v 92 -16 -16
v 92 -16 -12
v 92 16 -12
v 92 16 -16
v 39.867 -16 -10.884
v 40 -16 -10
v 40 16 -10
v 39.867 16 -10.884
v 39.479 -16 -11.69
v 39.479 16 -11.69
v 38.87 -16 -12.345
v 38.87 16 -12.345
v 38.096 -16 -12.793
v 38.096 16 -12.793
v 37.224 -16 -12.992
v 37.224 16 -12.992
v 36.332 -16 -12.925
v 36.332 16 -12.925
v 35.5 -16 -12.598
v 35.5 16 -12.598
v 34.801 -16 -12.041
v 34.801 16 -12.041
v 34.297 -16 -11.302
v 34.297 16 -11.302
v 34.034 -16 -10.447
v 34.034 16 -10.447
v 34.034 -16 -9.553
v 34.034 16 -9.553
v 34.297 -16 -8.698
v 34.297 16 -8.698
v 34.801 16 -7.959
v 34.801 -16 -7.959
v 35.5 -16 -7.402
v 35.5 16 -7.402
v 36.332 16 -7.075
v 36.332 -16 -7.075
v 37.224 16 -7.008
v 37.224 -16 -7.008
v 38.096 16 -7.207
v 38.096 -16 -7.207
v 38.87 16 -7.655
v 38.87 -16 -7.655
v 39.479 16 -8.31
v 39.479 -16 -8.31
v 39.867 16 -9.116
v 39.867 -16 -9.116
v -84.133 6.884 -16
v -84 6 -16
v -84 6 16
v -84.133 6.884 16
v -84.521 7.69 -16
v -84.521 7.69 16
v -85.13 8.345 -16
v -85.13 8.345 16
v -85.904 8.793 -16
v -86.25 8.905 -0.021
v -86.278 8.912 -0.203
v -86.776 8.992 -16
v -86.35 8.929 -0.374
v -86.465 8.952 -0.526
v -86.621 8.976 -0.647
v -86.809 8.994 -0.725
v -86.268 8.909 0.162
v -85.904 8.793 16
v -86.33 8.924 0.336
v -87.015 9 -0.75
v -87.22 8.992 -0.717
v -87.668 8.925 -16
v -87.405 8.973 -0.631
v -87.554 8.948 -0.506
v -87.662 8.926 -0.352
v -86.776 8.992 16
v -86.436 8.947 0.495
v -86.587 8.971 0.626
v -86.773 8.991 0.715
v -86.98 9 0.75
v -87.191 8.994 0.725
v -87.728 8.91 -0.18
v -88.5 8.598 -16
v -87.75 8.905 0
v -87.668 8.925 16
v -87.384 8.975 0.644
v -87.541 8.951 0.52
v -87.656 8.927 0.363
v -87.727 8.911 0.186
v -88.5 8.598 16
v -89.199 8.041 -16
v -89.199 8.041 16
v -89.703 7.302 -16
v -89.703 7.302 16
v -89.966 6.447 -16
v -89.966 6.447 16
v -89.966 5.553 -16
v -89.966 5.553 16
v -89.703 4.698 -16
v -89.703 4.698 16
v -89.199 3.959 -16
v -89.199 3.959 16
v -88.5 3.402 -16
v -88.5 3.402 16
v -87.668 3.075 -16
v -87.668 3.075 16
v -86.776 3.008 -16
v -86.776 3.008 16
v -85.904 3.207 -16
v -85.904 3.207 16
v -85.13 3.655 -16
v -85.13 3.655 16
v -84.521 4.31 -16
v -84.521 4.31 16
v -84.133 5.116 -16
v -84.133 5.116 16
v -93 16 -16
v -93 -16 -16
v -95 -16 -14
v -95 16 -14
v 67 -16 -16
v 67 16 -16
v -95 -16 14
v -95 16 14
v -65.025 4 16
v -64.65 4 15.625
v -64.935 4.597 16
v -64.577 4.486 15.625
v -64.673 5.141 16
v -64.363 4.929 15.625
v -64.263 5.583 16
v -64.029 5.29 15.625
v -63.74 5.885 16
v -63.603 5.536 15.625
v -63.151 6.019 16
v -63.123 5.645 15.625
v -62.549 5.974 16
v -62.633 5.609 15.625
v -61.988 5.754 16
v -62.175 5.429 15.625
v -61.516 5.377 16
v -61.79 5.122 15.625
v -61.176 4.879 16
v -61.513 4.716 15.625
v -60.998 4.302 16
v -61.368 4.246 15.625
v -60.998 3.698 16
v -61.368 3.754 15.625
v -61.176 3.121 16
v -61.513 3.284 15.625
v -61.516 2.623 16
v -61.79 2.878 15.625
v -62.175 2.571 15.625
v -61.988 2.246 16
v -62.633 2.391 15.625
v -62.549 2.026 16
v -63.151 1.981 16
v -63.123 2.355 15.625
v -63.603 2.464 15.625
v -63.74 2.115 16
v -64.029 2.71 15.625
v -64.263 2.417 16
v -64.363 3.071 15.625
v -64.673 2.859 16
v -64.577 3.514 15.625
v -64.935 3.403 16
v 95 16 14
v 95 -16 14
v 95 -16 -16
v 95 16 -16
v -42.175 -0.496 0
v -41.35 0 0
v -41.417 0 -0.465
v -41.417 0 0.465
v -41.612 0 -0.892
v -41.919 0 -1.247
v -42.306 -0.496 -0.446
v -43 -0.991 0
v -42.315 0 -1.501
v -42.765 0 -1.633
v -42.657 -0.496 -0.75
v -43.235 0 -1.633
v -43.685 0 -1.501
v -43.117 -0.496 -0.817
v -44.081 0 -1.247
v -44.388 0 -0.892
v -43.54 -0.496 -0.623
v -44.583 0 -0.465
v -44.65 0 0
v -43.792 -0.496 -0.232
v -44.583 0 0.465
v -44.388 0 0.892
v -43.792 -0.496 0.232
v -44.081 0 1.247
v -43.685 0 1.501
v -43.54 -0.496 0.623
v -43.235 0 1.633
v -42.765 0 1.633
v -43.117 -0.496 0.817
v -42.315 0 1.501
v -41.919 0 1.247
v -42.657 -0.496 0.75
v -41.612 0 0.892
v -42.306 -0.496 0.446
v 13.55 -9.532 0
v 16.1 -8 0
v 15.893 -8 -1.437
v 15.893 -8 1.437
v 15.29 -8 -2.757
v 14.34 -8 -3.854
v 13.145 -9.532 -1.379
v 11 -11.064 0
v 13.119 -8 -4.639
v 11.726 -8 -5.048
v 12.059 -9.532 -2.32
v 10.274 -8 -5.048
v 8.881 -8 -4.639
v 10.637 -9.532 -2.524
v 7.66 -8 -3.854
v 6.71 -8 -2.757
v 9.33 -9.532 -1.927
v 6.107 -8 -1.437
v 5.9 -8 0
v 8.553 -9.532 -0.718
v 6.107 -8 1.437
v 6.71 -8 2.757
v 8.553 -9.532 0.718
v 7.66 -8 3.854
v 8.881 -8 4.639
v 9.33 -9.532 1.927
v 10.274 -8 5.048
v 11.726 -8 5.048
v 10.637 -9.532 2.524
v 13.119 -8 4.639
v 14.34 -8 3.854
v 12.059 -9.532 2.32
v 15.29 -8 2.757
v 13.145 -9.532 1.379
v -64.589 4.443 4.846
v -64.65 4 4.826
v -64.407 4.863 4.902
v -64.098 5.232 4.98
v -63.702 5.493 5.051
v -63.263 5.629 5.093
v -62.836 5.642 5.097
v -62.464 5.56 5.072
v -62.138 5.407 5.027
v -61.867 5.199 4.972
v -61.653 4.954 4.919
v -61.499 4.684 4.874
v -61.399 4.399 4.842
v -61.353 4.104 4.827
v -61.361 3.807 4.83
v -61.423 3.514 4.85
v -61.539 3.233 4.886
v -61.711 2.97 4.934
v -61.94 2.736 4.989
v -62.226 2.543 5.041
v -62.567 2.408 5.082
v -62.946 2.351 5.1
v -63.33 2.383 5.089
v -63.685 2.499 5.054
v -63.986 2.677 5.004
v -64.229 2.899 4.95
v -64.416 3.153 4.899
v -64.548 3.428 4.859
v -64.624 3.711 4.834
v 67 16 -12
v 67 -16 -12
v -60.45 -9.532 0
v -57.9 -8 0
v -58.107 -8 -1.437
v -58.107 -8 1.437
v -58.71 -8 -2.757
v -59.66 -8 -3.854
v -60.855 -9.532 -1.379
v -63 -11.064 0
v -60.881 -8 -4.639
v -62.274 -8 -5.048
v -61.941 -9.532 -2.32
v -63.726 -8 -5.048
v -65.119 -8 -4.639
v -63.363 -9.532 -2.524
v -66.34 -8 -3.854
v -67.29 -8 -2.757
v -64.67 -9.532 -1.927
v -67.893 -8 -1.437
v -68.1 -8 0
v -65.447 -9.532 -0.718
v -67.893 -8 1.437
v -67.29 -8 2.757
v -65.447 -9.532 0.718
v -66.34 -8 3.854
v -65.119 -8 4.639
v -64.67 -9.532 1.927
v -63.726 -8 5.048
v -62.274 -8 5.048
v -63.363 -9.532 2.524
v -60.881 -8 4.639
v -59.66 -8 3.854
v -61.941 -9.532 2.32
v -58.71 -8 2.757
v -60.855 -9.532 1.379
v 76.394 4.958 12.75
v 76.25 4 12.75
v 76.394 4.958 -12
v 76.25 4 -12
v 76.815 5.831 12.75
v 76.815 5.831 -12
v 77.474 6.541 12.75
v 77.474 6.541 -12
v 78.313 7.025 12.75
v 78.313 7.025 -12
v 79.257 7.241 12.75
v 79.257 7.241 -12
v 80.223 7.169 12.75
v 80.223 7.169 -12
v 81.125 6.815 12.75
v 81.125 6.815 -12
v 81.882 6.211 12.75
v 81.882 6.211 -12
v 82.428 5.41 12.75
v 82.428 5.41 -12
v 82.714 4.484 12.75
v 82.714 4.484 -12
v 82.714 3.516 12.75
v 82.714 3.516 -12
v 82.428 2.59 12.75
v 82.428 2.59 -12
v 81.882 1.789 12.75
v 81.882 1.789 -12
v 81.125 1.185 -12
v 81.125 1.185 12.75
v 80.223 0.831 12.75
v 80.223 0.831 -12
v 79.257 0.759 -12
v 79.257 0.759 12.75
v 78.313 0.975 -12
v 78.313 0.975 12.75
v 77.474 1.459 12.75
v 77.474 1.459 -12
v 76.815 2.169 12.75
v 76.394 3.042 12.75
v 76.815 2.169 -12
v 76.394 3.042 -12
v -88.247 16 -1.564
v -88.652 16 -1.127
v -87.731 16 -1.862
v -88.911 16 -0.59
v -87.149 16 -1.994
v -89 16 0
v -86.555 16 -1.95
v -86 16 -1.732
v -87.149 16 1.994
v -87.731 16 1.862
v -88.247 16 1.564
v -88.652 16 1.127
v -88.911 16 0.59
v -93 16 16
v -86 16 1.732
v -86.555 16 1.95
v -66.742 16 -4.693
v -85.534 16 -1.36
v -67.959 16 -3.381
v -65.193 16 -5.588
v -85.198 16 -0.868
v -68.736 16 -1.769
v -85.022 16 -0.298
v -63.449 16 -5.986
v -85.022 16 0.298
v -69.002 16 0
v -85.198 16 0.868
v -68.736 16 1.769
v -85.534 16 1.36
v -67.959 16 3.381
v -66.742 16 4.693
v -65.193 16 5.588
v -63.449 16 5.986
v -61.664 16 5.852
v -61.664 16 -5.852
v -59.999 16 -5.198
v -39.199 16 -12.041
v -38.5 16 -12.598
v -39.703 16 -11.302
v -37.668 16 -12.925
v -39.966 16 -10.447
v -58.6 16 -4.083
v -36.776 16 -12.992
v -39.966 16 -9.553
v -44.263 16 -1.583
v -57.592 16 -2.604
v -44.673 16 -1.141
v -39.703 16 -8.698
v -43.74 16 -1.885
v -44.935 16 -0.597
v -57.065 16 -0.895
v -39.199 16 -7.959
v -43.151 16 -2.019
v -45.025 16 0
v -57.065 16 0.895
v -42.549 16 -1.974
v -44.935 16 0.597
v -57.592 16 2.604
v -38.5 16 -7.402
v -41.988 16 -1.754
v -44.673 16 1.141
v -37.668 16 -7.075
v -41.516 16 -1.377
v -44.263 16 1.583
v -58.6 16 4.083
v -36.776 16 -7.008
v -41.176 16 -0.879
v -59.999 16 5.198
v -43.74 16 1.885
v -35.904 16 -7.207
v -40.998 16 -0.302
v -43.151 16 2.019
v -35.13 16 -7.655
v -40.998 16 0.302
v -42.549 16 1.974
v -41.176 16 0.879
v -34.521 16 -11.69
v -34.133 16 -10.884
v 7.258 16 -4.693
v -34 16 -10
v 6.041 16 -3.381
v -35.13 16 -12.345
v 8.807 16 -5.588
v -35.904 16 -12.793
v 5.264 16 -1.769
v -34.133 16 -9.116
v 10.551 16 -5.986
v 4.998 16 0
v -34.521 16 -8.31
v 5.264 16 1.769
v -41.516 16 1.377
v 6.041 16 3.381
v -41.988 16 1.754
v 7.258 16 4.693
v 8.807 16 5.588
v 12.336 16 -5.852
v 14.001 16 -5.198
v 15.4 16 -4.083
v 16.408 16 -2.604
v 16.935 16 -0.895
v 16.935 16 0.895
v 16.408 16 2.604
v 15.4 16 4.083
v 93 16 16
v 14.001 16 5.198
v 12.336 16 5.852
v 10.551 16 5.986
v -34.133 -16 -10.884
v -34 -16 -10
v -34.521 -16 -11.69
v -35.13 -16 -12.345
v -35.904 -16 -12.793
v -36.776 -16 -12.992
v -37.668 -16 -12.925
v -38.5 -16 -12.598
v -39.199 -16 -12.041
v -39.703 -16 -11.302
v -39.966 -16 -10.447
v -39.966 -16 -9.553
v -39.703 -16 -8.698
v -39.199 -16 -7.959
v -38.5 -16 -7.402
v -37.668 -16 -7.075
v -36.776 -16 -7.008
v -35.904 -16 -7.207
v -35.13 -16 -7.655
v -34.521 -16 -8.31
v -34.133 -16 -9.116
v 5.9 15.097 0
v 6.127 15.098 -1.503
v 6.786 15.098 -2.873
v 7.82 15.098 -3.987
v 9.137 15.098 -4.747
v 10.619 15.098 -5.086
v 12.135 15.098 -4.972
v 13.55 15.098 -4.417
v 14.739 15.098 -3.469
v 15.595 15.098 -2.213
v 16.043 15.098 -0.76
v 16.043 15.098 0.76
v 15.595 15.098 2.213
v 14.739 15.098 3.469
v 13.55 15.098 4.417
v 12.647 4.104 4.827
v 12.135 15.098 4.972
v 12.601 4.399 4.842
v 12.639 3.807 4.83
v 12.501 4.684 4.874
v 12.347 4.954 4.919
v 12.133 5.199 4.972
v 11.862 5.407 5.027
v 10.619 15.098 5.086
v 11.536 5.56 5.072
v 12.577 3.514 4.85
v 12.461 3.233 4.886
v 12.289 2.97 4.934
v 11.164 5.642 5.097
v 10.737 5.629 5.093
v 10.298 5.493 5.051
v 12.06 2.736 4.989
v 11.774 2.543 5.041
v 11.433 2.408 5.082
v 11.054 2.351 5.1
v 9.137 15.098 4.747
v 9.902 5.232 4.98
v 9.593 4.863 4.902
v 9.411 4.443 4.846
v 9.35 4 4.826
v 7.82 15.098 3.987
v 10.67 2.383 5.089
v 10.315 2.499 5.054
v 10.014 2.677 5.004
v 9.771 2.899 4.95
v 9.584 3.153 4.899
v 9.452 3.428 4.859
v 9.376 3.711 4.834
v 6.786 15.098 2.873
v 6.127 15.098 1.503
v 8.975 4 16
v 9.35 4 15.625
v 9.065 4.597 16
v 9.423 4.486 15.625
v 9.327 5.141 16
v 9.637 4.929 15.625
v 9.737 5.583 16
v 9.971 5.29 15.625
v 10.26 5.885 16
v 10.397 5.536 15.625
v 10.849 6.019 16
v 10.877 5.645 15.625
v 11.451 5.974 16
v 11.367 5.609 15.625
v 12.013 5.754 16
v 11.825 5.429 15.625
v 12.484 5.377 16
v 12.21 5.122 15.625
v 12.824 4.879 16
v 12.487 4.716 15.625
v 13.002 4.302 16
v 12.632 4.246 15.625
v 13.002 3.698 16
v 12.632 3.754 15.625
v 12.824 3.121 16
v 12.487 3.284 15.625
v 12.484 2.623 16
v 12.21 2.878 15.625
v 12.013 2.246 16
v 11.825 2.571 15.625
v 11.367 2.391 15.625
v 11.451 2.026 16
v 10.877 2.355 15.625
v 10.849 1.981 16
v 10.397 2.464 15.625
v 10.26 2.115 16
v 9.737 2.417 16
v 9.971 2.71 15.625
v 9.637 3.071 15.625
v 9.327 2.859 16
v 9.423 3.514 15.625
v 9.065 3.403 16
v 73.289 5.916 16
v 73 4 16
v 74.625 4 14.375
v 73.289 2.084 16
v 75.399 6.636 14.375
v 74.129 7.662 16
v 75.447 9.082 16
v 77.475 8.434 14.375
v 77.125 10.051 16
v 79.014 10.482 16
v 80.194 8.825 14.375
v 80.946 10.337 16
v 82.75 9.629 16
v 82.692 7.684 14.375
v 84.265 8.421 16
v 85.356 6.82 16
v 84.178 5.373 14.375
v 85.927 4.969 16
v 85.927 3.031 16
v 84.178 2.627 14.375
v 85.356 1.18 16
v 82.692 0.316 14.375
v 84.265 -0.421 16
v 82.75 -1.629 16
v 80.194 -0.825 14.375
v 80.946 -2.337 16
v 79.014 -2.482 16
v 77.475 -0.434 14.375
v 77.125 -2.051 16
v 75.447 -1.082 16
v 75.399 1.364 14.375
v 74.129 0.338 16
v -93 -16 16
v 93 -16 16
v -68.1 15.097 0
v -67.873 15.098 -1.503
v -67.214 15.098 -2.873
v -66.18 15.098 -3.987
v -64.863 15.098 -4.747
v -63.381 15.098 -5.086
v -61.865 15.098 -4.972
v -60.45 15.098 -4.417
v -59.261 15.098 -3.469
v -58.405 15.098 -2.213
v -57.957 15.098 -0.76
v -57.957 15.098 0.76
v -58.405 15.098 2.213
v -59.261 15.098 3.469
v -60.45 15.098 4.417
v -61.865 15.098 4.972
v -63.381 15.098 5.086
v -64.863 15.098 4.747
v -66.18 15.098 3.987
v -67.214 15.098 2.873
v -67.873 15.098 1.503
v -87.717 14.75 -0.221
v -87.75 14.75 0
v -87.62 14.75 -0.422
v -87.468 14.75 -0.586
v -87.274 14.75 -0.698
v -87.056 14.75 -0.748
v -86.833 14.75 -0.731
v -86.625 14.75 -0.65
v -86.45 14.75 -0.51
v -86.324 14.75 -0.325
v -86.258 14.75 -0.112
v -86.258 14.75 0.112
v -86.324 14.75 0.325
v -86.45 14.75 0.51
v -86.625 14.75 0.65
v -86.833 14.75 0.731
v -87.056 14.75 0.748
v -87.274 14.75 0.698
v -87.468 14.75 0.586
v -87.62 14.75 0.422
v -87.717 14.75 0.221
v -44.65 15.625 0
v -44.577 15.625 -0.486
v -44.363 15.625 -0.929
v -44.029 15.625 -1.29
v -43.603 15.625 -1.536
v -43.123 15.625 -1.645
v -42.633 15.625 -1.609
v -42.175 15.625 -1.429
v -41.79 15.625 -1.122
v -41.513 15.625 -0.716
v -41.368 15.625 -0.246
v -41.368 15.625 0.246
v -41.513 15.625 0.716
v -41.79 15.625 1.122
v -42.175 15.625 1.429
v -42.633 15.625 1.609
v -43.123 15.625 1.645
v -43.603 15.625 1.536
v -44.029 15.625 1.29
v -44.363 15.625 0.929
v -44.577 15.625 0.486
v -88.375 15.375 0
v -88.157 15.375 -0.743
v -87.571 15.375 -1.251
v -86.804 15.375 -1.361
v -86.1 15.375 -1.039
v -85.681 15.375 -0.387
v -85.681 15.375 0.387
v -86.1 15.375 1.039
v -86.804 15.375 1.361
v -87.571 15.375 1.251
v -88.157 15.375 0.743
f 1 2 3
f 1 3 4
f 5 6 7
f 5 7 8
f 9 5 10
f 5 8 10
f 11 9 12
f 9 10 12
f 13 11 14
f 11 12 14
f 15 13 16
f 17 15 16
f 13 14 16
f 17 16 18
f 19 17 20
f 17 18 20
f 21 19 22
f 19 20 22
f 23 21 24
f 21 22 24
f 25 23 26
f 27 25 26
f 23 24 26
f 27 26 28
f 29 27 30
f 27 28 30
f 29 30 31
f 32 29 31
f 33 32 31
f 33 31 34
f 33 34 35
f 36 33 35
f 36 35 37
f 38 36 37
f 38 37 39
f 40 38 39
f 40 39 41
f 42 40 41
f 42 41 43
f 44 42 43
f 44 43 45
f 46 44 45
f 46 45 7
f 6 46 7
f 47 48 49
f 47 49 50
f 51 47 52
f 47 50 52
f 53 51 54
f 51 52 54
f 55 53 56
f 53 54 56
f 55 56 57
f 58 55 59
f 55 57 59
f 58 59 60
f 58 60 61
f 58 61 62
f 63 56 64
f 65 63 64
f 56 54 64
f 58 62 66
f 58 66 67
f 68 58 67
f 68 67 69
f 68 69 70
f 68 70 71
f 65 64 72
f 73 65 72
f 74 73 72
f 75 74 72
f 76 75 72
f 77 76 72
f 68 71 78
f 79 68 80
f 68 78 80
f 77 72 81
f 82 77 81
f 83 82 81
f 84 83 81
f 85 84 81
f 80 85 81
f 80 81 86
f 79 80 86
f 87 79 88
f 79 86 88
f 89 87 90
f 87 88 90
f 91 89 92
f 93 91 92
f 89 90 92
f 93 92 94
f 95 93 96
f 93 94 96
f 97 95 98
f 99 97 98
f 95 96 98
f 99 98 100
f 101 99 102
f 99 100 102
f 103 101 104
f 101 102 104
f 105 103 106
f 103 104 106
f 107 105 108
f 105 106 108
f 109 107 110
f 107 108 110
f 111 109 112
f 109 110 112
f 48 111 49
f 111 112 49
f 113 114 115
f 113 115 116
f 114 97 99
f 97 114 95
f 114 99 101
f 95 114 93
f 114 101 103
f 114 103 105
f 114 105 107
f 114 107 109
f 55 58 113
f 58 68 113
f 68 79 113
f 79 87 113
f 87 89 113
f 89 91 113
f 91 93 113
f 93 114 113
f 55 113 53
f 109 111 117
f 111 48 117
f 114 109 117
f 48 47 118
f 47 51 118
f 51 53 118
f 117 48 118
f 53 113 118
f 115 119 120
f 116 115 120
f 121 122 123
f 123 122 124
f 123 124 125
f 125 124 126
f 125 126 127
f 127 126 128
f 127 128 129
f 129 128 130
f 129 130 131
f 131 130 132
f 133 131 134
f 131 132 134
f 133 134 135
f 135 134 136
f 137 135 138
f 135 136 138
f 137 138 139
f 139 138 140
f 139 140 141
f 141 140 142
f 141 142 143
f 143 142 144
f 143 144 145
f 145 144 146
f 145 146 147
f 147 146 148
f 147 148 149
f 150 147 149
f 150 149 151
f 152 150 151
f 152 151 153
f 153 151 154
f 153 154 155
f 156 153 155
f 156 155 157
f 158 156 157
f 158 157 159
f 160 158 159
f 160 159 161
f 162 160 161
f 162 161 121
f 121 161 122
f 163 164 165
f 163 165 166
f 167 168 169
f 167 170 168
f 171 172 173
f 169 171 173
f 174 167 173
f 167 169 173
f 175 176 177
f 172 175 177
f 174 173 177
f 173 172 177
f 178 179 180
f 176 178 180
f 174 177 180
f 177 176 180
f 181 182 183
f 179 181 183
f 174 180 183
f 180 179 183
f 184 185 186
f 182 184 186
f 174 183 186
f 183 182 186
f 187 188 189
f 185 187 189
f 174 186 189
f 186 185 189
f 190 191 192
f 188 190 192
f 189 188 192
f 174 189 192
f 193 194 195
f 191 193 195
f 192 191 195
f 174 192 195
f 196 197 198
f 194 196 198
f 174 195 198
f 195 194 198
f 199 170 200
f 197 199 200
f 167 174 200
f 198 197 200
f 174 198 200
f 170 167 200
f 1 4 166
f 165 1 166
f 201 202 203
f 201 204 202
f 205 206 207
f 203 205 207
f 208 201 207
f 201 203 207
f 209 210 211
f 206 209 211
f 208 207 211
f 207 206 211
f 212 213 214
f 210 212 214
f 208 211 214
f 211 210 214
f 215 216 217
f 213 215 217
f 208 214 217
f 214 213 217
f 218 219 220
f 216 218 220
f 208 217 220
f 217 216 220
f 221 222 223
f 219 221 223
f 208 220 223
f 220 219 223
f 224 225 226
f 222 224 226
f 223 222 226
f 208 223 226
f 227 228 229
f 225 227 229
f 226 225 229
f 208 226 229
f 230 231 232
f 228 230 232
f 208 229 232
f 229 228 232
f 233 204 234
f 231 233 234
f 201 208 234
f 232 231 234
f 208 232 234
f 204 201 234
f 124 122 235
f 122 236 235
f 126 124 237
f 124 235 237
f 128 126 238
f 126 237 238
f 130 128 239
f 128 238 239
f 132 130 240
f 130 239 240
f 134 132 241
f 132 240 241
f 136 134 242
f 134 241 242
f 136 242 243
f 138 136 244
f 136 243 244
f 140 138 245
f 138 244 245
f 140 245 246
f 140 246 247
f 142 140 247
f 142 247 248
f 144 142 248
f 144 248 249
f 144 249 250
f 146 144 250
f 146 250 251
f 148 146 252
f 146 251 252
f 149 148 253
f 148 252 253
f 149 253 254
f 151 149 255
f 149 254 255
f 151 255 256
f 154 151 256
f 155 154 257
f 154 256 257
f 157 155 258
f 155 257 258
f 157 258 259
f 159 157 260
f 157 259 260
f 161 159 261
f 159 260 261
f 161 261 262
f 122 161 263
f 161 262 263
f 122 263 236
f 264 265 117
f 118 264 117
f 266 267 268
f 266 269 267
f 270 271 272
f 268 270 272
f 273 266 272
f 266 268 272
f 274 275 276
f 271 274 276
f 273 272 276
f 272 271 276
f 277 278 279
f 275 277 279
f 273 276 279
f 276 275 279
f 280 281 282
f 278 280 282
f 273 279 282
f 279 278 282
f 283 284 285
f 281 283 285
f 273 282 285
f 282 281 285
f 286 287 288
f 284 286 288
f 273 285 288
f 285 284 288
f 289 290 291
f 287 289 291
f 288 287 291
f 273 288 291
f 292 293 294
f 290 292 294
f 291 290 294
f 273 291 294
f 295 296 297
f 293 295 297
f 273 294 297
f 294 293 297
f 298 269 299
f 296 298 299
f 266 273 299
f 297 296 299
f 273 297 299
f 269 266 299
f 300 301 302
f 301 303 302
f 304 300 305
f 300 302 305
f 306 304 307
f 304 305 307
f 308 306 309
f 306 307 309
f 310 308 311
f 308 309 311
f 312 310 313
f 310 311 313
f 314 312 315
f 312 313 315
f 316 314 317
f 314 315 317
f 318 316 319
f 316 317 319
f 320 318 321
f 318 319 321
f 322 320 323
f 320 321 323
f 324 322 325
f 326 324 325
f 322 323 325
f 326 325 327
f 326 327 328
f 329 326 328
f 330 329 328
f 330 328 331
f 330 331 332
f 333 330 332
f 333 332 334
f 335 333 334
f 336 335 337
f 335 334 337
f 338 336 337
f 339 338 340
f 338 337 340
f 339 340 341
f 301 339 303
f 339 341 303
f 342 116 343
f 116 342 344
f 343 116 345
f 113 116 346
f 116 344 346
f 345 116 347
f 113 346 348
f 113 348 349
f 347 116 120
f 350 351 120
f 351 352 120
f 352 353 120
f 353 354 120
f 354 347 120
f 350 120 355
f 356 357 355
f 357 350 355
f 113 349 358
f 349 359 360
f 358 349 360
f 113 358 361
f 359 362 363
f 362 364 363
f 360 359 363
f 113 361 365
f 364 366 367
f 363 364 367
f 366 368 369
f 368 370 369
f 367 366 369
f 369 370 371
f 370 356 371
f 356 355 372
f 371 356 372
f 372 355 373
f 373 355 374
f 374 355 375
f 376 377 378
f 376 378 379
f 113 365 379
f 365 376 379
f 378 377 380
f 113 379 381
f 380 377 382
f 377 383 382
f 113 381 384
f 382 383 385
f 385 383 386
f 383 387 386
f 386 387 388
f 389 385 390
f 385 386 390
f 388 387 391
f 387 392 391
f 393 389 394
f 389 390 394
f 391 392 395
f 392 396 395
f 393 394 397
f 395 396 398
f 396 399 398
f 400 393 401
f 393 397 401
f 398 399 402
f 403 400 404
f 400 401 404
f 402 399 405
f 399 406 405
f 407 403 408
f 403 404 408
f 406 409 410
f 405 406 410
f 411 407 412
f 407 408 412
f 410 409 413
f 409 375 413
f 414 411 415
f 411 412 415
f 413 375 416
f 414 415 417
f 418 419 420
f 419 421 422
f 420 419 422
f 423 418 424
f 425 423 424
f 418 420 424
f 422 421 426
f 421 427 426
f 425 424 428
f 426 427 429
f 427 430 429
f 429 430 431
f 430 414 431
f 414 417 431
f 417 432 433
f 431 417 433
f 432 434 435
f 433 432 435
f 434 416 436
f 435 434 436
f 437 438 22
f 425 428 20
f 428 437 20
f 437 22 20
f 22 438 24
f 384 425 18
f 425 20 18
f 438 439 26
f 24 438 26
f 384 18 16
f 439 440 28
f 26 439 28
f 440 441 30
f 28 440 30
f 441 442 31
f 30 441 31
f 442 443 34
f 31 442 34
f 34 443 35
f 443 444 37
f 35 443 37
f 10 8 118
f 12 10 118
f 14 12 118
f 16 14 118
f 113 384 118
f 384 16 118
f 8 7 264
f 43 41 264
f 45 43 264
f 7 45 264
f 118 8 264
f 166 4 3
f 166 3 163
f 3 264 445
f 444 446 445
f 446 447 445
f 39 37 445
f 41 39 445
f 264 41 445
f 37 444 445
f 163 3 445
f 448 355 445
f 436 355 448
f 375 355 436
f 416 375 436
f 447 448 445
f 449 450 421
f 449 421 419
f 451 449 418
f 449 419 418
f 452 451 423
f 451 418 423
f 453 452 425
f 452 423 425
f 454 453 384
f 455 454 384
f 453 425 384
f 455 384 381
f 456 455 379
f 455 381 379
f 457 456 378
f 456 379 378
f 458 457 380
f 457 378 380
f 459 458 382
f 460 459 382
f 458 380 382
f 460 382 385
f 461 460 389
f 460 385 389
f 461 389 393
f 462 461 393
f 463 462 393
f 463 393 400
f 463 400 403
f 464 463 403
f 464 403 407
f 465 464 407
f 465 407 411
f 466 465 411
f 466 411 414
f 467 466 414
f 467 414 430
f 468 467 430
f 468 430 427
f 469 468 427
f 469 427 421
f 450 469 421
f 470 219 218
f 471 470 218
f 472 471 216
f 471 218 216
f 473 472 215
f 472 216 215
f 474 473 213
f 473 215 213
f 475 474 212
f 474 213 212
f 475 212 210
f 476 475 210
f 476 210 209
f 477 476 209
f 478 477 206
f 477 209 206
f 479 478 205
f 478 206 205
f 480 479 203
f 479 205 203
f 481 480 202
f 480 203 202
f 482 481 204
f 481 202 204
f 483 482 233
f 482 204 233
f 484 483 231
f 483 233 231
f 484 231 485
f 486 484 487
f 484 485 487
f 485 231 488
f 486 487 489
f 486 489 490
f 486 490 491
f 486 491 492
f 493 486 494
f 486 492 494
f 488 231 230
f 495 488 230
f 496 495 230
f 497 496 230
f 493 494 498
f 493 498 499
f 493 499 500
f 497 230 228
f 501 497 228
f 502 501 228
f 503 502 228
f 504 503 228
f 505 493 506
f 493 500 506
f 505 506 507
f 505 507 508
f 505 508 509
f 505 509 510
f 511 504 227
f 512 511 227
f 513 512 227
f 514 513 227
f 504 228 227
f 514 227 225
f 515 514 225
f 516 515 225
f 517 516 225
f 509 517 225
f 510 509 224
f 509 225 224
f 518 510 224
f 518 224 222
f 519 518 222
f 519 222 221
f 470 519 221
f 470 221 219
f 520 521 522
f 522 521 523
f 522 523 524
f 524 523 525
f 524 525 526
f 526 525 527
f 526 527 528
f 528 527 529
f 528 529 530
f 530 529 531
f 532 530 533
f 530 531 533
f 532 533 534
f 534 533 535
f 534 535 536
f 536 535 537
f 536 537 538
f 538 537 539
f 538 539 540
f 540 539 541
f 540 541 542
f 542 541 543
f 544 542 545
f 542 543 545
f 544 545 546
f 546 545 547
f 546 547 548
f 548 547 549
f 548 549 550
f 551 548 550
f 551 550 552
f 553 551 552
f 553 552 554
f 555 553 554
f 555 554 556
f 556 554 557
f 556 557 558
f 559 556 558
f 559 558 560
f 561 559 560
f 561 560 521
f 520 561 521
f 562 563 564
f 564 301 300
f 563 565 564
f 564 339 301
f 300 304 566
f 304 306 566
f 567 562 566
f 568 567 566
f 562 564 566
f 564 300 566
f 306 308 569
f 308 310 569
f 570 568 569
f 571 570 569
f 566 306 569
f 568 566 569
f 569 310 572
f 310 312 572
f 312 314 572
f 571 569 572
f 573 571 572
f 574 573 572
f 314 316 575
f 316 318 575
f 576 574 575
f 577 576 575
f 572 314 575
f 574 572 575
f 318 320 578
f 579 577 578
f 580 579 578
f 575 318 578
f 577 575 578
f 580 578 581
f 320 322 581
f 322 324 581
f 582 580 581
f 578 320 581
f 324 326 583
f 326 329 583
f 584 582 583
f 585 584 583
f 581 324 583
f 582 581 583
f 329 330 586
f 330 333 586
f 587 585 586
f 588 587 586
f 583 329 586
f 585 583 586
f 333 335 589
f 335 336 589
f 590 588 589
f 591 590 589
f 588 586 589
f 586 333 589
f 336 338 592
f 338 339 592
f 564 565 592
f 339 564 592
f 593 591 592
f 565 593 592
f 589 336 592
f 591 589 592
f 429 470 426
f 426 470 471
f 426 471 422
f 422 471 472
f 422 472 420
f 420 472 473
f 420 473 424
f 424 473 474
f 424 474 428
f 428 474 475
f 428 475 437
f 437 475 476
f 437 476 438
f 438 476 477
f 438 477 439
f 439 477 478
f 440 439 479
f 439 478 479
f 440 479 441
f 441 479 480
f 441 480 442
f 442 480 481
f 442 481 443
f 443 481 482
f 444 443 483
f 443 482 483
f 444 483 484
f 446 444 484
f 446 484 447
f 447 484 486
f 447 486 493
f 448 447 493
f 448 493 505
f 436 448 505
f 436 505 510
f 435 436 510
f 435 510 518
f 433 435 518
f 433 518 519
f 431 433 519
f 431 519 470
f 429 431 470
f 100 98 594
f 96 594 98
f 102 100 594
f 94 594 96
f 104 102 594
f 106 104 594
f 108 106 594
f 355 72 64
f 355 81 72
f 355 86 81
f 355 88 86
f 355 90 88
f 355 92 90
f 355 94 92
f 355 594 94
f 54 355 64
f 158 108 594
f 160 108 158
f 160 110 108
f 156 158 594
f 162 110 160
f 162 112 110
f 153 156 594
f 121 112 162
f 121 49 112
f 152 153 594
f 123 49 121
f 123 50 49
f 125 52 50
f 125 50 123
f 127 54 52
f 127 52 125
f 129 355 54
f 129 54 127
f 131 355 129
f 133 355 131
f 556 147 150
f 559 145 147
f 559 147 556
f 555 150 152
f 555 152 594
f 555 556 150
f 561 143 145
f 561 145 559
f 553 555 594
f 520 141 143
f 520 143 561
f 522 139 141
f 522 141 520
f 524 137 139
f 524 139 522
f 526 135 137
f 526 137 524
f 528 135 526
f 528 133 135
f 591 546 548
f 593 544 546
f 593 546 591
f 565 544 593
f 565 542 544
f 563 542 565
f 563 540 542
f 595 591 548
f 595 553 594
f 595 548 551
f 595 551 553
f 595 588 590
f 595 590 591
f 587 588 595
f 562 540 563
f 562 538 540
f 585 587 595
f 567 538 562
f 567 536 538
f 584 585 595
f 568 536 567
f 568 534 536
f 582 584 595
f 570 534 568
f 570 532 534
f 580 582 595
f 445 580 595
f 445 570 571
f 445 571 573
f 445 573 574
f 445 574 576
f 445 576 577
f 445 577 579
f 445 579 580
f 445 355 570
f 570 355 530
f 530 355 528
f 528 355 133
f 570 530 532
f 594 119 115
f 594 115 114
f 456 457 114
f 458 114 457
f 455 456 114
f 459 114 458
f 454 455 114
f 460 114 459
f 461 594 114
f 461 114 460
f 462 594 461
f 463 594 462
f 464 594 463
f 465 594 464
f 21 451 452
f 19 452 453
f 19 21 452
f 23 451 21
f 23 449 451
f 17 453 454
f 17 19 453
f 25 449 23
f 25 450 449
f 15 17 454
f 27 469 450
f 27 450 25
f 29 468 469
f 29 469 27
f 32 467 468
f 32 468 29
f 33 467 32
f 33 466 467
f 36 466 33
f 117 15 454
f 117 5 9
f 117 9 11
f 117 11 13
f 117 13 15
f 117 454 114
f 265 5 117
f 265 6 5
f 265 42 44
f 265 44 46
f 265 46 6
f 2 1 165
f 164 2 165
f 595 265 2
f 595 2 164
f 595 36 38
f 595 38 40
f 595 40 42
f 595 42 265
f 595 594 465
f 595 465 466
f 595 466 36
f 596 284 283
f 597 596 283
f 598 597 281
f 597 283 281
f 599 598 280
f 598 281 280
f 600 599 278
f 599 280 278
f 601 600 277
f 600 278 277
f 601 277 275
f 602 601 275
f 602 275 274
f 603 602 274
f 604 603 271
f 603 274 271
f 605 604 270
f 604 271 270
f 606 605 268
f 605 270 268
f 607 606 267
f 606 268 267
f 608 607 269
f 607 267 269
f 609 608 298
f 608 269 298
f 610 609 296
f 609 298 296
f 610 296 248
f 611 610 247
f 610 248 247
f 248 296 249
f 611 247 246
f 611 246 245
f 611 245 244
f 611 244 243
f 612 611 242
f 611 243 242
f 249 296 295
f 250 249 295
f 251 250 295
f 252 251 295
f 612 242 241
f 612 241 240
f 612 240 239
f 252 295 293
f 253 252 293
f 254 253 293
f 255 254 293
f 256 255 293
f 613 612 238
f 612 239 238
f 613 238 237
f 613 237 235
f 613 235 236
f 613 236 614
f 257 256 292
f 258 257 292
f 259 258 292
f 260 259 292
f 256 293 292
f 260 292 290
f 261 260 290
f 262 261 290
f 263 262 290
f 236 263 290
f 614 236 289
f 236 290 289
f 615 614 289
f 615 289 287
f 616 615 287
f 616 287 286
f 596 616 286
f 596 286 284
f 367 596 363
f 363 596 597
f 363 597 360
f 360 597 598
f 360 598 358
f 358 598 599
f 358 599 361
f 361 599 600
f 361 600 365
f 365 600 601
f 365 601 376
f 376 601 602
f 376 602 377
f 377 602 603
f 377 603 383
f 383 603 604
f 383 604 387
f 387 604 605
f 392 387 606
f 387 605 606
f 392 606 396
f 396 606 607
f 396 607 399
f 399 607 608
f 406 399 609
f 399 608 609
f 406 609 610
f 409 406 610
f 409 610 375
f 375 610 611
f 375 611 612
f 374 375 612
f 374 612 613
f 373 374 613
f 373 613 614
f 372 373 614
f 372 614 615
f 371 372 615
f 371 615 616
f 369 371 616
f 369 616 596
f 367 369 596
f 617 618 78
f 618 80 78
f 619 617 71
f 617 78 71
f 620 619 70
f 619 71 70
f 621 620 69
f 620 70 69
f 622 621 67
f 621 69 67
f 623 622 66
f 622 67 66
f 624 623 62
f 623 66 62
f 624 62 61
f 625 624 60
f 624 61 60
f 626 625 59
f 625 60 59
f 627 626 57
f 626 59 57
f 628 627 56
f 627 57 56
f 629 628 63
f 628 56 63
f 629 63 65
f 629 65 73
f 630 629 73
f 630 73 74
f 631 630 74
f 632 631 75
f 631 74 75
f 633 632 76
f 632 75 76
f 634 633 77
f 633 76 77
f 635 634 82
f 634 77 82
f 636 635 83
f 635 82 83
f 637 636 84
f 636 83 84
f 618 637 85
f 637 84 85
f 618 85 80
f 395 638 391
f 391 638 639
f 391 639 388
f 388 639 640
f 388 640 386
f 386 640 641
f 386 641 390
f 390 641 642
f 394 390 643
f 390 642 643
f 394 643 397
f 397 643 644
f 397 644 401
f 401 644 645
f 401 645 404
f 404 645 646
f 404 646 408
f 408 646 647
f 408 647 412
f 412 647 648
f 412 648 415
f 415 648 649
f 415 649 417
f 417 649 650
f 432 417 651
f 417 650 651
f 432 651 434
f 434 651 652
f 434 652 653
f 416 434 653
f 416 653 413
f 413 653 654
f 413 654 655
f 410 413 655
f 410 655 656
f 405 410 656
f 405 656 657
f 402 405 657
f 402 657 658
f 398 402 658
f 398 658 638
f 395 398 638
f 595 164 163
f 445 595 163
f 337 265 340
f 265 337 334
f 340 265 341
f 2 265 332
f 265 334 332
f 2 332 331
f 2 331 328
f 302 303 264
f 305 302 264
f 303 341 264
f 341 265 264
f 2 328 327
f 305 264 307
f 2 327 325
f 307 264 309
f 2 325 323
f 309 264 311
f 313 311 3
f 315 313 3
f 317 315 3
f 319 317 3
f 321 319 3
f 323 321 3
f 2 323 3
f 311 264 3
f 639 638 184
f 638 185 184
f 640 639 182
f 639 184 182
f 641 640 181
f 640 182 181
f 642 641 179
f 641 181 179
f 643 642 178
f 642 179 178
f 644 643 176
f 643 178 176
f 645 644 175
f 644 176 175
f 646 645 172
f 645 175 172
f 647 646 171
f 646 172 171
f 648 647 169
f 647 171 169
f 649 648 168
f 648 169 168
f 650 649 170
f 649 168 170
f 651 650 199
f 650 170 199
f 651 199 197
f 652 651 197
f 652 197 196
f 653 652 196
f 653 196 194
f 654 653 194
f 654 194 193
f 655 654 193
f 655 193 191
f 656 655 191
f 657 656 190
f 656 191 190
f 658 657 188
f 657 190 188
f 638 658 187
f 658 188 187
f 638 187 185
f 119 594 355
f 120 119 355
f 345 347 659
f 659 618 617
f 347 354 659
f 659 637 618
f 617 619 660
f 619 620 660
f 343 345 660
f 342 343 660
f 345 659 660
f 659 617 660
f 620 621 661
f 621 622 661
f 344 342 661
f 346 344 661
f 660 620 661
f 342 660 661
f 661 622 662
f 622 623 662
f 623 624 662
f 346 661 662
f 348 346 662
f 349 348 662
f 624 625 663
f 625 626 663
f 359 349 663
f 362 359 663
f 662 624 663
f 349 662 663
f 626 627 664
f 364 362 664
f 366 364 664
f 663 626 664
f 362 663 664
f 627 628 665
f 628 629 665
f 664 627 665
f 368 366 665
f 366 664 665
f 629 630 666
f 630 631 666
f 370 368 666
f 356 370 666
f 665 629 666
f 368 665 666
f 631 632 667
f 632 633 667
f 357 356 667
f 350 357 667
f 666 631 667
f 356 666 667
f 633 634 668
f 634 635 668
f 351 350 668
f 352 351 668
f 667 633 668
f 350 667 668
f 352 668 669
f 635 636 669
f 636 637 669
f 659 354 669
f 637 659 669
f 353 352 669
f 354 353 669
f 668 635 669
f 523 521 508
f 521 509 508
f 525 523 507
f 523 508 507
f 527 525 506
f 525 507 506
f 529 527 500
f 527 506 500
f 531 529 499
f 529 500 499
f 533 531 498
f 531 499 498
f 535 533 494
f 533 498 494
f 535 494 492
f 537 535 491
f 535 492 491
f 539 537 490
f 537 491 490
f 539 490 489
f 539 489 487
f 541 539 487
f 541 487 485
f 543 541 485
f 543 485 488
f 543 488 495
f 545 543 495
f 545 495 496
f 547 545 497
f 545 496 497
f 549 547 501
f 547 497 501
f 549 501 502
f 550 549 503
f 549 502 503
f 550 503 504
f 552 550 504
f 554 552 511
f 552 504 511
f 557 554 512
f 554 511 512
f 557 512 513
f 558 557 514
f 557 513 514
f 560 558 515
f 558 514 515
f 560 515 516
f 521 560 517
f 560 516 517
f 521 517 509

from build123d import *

# Parameters (mm, degrees)
SKETCH1_W                                            = 190
SKETCH1_H                                            = 32
BOSS_EXTRUDE1_DEPTH                                  = 16
CHAMFER1_SIZE                                        = 2
SKETCH2_W                                            = 25
SKETCH2_H                                            = 4
CUT_EXTRUDE1_DEPTH                                   = 33
M12_TAPPED_HOLE1_D                                   = 10.2
M12_TAPPED_HOLE1_DEPTH                               = 24
M12_TAPPED_HOLE1_CSINK_D                             = 12.005
M12_TAPPED_HOLE1_CSINK_ANGLE                         = 90
M12_TAPPED_HOLE1_TIP                                 = 3.064389157
M4_TAPPED_HOLE2_D                                    = 3.3
M4_TAPPED_HOLE2_DEPTH                                = 11.5
M4_TAPPED_HOLE2_CSINK_D                              = 4.05
M4_TAPPED_HOLE2_CSINK_ANGLE                          = 90
M4_TAPPED_HOLE2_TIP                                  = 0.991420021
CSK_FOR_M10_COUNTERSUNK_FLAT_HEAD_SCREW1_D           = 6.5
CSK_FOR_M10_COUNTERSUNK_FLAT_HEAD_SCREW1_CSINK_D     = 13
CSK_FOR_M10_COUNTERSUNK_FLAT_HEAD_SCREW1_CSINK_ANGLE = 90
SKETCH16_R                                           = 3
CUT_EXTRUDE2_DEPTH                                   = 33
CSK_FOR_M4_COUNTERSUNK_FLAT_HEAD_SCREW1_D            = 1.5
CSK_FOR_M4_COUNTERSUNK_FLAT_HEAD_SCREW1_DEPTH        = 10
CSK_FOR_M4_COUNTERSUNK_FLAT_HEAD_SCREW1_CSINK_D      = 4
CSK_FOR_M4_COUNTERSUNK_FLAT_HEAD_SCREW1_CSINK_ANGLE  = 90
CSK_FOR_M4_COUNTERSUNK_FLAT_HEAD_SCREW1_TIP          = 0.450645464
M4_TAPPED_HOLE3_D                                    = 3.3
M4_TAPPED_HOLE3_DEPTH                                = 16
M4_TAPPED_HOLE3_CSINK_D                              = 4.05
M4_TAPPED_HOLE3_CSINK_ANGLE                          = 90
M4_TAPPED_HOLE3_TIP                                  = 0.991420021
SKETCH24_R                                           = 3
CUT_EXTRUDE4_DEPTH                                   = 33


with BuildPart() as part:
    # Sketch1 → Boss-Extrude1 (new body, symmetric)
    with BuildSketch(Plane.XY):
        Rectangle(SKETCH1_W, SKETCH1_H)
    extrude(amount=BOSS_EXTRUDE1_DEPTH, both=True)

    # Chamfer1
    chamfer1_edges = [part.edges().sort_by_distance(p)[0] for p in [
        (-95, 0, 16),
        (95, 0, 16),
        (-95, 0, -16),
    ]]
    chamfer(chamfer1_edges, length=CHAMFER1_SIZE)

    # Sketch2 → Cut-Extrude1 (cut, through all)
    with BuildSketch(Plane(origin=(0, 16, 0), x_dir=(1, 0, 0), z_dir=(0, 1, 0))):
        with Locations((79.5, 14)):
            Rectangle(SKETCH2_W, SKETCH2_H)
    extrude(amount=-CUT_EXTRUDE1_DEPTH, mode=Mode.SUBTRACT)

    # M12 Tapped Hole1
    with Locations(Plane(origin=(0, 16, 0), x_dir=(1, 0, 0), z_dir=(0, 1, 0))):
        with Locations((-63, 0), (11, 0)):
            CounterSinkHole(M12_TAPPED_HOLE1_D / 2, M12_TAPPED_HOLE1_CSINK_D / 2, depth=M12_TAPPED_HOLE1_DEPTH, counter_sink_angle=M12_TAPPED_HOLE1_CSINK_ANGLE)
            with Locations((0, 0, -(M12_TAPPED_HOLE1_DEPTH + M12_TAPPED_HOLE1_TIP / 2))):  # 118° drill point
                Cone(0, M12_TAPPED_HOLE1_D / 2, M12_TAPPED_HOLE1_TIP, mode=Mode.SUBTRACT)

    # M4 Tapped Hole2
    with Locations(Plane(origin=(-63, 4, 16), x_dir=(1, 0, 0), z_dir=(0, 0, 1))):
        with Locations((0, 0), (74, 0)):
            CounterSinkHole(M4_TAPPED_HOLE2_D / 2, M4_TAPPED_HOLE2_CSINK_D / 2, depth=M4_TAPPED_HOLE2_DEPTH, counter_sink_angle=M4_TAPPED_HOLE2_CSINK_ANGLE)
            with Locations((0, 0, -(M4_TAPPED_HOLE2_DEPTH + M4_TAPPED_HOLE2_TIP / 2))):  # 118° drill point
                Cone(0, M4_TAPPED_HOLE2_D / 2, M4_TAPPED_HOLE2_TIP, mode=Mode.SUBTRACT)

    # CSK for M10 Countersunk Flat Head Screw1 (through all)
    with Locations(Plane.XY.offset(16)):
        with Locations((79.5, 4)):
            CounterSinkHole(CSK_FOR_M10_COUNTERSUNK_FLAT_HEAD_SCREW1_D / 2, CSK_FOR_M10_COUNTERSUNK_FLAT_HEAD_SCREW1_CSINK_D / 2, counter_sink_angle=CSK_FOR_M10_COUNTERSUNK_FLAT_HEAD_SCREW1_CSINK_ANGLE)

    # Sketch16 → Cut-Extrude2 (cut, through all)
    with BuildSketch(Plane.XY.offset(16)):
        with Locations((-87, 6)):
            Circle(SKETCH16_R)
    extrude(amount=-CUT_EXTRUDE2_DEPTH, mode=Mode.SUBTRACT)

    # CSK for M4 Countersunk Flat Head Screw1
    with Locations(Plane(origin=(0, 16, 0), x_dir=(1, 0, 0), z_dir=(0, 1, 0))):
        with Locations((-87, 0)):
            CounterSinkHole(CSK_FOR_M4_COUNTERSUNK_FLAT_HEAD_SCREW1_D / 2, CSK_FOR_M4_COUNTERSUNK_FLAT_HEAD_SCREW1_CSINK_D / 2, depth=CSK_FOR_M4_COUNTERSUNK_FLAT_HEAD_SCREW1_DEPTH, counter_sink_angle=CSK_FOR_M4_COUNTERSUNK_FLAT_HEAD_SCREW1_CSINK_ANGLE)
            with Locations((0, 0, -(CSK_FOR_M4_COUNTERSUNK_FLAT_HEAD_SCREW1_DEPTH + CSK_FOR_M4_COUNTERSUNK_FLAT_HEAD_SCREW1_TIP / 2))):  # 118° drill point
                Cone(0, CSK_FOR_M4_COUNTERSUNK_FLAT_HEAD_SCREW1_D / 2, CSK_FOR_M4_COUNTERSUNK_FLAT_HEAD_SCREW1_TIP, mode=Mode.SUBTRACT)

    # M4 Tapped Hole3
    with Locations(Plane(origin=(0, 16, 0), x_dir=(1, 0, 0), z_dir=(0, 1, 0))):
        with Locations((-43, 0)):
            CounterSinkHole(M4_TAPPED_HOLE3_D / 2, M4_TAPPED_HOLE3_CSINK_D / 2, depth=M4_TAPPED_HOLE3_DEPTH, counter_sink_angle=M4_TAPPED_HOLE3_CSINK_ANGLE)
            with Locations((0, 0, -(M4_TAPPED_HOLE3_DEPTH + M4_TAPPED_HOLE3_TIP / 2))):  # 118° drill point
                Cone(0, M4_TAPPED_HOLE3_D / 2, M4_TAPPED_HOLE3_TIP, mode=Mode.SUBTRACT)

    # Sketch24 → Cut-Extrude4 (cut, through all)
    with BuildSketch(Plane(origin=(0, 16, 0), x_dir=(1, 0, 0), z_dir=(0, 1, 0))):
        with Locations((-37, 10)):
            Circle(SKETCH24_R)
        with Locations((37, 10)):
            Circle(SKETCH24_R)
    extrude(amount=-CUT_EXTRUDE4_DEPTH, mode=Mode.SUBTRACT)


solid = part.part
